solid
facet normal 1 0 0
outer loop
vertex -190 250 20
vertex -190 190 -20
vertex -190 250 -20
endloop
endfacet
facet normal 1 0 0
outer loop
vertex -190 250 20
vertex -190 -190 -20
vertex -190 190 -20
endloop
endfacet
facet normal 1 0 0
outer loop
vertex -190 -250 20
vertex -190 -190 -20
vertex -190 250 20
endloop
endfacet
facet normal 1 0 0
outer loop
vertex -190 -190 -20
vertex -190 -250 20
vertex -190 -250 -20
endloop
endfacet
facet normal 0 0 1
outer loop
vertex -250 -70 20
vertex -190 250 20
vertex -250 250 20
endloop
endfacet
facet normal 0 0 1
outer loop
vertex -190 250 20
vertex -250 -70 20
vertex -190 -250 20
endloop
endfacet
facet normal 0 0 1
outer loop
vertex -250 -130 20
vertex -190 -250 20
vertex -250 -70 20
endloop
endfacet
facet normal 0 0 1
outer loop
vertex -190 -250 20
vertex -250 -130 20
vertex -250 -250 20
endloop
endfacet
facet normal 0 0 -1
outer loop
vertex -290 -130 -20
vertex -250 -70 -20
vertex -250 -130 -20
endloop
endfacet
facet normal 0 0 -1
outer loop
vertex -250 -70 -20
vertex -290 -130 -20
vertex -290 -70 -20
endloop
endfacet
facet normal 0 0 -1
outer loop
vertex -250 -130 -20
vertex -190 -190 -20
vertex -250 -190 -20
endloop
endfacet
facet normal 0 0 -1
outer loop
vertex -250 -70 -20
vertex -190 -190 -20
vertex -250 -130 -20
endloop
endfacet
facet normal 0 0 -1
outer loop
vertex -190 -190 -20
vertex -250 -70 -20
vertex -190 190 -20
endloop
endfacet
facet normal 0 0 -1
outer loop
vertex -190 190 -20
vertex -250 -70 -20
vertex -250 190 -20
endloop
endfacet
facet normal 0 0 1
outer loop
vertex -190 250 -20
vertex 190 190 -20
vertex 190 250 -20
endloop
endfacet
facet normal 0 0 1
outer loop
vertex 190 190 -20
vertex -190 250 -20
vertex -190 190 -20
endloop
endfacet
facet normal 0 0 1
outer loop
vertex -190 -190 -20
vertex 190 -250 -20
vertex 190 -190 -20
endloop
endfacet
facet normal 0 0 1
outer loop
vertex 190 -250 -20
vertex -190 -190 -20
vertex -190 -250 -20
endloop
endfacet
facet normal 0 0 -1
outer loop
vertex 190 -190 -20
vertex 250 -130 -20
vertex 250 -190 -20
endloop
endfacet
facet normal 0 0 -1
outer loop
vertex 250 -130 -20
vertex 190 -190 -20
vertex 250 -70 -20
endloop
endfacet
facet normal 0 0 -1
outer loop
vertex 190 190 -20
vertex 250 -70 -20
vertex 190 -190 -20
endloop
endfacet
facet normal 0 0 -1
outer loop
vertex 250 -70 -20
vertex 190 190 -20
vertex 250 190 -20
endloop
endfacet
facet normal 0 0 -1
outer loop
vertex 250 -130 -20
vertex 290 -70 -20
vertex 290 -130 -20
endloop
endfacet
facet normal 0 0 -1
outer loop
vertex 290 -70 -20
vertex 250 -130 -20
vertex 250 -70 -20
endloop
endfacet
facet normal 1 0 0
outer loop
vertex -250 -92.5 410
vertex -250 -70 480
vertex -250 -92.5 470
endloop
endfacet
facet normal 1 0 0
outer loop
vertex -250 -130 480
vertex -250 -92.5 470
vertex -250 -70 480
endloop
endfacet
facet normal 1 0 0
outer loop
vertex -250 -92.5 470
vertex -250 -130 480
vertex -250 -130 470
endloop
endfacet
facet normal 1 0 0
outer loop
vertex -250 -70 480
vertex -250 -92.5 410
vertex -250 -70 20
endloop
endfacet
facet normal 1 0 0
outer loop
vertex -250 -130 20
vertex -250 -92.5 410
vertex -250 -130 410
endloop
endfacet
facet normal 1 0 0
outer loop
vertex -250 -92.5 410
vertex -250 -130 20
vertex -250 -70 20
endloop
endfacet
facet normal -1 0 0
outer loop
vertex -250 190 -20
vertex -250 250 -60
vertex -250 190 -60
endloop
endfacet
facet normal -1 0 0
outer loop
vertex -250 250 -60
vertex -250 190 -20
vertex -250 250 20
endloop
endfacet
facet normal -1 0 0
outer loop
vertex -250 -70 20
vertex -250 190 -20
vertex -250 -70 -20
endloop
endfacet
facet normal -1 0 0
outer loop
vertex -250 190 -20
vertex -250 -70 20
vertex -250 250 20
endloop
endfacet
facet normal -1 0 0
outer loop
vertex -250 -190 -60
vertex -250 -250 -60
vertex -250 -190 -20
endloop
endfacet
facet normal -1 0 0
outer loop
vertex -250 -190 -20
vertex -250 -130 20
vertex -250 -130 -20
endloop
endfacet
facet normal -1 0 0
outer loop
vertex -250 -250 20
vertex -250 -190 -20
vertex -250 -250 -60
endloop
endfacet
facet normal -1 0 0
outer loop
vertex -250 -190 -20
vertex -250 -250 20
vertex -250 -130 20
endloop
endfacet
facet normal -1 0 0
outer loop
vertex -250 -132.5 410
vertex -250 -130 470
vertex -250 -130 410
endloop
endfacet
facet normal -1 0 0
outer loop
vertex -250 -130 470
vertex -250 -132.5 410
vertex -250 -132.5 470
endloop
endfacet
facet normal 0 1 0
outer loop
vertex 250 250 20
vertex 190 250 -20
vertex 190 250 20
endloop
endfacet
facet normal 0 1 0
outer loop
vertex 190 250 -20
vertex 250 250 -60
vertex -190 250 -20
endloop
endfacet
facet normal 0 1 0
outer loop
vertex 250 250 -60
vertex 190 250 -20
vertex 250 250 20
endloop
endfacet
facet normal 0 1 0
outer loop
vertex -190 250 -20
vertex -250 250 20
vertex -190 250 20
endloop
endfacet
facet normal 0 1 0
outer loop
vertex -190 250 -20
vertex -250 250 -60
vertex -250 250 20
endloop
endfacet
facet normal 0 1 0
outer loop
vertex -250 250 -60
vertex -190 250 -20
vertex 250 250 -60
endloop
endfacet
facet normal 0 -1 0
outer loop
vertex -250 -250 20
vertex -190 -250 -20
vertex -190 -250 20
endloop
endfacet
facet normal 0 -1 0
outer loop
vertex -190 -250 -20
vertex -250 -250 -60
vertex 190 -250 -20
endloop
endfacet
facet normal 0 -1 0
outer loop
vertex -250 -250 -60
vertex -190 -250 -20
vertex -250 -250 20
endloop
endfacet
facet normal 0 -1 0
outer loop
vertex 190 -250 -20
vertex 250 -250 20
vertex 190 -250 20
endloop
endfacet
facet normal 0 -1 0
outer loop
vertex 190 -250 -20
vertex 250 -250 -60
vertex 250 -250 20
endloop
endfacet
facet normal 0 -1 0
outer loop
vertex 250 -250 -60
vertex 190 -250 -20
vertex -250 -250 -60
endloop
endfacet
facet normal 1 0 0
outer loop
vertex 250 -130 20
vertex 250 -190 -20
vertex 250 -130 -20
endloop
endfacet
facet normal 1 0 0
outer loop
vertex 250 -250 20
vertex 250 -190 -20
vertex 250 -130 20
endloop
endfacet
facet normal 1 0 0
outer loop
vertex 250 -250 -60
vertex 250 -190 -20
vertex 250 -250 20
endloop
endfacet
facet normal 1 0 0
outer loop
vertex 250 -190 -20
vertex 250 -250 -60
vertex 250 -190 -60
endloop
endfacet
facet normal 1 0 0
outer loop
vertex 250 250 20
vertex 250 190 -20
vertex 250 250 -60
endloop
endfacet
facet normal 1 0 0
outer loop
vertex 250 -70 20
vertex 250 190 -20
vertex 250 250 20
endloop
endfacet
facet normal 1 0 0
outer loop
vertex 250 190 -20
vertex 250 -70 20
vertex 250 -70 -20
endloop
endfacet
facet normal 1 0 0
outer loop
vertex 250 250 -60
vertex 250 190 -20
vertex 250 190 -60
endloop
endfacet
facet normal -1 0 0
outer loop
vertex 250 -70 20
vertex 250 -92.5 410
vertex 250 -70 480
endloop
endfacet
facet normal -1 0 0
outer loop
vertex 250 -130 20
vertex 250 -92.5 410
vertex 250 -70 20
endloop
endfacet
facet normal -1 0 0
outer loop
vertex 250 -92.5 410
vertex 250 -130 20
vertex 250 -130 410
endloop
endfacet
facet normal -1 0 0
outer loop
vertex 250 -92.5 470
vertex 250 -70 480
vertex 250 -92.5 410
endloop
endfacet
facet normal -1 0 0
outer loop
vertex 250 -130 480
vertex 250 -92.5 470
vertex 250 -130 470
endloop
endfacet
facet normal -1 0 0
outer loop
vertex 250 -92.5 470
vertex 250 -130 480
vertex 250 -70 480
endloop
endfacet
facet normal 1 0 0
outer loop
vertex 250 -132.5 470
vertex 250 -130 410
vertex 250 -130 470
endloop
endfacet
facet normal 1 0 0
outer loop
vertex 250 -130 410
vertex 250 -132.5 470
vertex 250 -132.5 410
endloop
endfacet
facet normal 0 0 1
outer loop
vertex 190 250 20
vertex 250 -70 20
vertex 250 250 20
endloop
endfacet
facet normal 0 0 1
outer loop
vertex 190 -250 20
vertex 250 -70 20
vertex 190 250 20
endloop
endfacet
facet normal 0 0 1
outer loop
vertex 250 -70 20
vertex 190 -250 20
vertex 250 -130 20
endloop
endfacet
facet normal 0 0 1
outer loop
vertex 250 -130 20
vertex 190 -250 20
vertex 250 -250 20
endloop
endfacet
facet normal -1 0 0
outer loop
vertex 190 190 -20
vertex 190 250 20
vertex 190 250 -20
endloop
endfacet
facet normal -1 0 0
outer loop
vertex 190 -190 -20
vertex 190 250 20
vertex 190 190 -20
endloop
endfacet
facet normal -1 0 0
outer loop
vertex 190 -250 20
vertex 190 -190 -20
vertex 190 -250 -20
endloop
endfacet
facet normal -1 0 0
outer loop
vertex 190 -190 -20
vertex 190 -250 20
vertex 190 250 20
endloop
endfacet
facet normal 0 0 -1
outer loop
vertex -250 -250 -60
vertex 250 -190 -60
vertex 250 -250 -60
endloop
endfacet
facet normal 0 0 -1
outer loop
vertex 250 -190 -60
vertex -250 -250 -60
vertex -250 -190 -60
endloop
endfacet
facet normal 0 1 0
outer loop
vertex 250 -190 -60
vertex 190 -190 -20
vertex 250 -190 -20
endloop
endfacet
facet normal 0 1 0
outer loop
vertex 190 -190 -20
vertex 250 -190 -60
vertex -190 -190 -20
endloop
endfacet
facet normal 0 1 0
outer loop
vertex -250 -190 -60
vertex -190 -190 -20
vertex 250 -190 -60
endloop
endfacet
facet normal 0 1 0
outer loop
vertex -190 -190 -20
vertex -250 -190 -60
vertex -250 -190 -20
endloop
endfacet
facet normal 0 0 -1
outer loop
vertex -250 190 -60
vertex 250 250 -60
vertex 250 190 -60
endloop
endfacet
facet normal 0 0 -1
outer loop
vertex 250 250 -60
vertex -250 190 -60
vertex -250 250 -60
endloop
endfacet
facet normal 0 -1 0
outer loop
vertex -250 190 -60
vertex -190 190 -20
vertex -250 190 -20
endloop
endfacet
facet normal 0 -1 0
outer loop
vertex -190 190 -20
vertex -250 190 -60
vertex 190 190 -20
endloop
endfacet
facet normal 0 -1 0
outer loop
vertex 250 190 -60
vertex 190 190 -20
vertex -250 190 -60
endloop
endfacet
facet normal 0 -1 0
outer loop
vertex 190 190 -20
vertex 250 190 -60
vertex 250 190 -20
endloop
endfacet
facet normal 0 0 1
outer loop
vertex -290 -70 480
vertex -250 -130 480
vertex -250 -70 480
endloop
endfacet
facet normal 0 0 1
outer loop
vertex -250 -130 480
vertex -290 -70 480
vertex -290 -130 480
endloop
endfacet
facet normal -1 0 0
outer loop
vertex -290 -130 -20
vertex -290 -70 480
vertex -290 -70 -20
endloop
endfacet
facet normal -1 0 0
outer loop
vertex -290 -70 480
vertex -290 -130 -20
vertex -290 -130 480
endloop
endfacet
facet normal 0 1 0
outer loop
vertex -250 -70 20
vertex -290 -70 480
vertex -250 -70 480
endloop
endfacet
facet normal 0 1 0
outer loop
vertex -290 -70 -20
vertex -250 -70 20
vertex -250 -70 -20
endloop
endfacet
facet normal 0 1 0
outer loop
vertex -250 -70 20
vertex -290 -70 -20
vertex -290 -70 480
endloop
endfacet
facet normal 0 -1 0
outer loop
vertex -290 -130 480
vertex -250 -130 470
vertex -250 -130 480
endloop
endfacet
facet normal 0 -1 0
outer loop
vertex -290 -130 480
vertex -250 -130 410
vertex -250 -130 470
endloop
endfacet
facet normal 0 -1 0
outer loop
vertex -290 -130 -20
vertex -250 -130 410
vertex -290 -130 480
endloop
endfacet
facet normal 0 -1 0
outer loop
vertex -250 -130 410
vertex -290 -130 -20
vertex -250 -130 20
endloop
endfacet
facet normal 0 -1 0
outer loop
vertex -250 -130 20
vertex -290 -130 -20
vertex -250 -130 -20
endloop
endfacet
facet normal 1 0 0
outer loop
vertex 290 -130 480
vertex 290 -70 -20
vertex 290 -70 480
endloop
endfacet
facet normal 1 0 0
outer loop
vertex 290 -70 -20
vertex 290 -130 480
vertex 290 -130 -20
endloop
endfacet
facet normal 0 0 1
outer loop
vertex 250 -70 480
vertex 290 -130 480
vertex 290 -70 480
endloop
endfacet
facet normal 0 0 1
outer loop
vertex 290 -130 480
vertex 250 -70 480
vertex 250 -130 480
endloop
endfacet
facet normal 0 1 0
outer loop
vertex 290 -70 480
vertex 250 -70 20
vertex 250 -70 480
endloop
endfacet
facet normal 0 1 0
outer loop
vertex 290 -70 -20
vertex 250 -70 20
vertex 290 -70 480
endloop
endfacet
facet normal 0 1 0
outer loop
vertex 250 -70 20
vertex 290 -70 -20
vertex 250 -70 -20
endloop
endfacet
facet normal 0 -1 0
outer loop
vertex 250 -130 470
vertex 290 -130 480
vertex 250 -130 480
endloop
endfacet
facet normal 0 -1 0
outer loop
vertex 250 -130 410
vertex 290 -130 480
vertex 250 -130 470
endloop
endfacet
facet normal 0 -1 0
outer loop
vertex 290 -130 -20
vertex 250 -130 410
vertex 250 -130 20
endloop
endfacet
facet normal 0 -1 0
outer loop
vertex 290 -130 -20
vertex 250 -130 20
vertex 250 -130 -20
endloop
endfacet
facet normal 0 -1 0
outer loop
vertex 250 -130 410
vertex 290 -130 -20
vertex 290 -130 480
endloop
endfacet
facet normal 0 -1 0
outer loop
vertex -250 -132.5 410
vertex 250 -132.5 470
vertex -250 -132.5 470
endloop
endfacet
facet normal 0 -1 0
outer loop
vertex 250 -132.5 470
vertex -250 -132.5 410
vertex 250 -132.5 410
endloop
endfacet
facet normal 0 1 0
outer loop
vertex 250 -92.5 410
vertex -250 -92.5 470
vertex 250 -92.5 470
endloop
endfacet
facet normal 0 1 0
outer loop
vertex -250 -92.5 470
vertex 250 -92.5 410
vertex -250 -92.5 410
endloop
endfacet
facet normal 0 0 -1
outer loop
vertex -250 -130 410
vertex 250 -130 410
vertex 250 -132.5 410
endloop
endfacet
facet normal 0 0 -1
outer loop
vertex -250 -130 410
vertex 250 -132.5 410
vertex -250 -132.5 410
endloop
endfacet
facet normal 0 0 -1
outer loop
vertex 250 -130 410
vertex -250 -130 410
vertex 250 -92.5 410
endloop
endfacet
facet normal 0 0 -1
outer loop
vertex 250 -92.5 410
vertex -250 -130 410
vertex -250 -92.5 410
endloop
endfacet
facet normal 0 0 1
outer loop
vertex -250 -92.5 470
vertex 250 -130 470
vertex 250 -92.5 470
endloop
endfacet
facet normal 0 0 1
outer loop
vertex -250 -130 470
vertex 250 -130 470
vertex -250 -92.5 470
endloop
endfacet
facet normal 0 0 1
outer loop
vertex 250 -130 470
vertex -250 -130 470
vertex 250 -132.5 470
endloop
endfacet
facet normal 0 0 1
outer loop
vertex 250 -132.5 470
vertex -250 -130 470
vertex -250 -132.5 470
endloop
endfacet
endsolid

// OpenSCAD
profil_H = 40;
profil_W = 60;

profilX_LEN = 500;
profilY_LEN = 500;
profilZ_LEN = 500;
profilX_OFFSET = 250;
profilY_OFFSET = 250;
profilZ_OFFSET = -100;

module profilY() {
    color("gray") cube([profil_W, profilY_LEN, profil_H], center = true);
}

module profilX() {
    color("gray") cube([profilX_LEN, profil_W, profil_H], center = true);
}

module profilZ() {
    color("gray") cube([profil_H, profil_W, profilX_LEN], center = true);
}

# translate([-profilX_OFFSET + profil_W/2, 0, 0]) profilY();
# translate([ profilX_OFFSET - profil_W/2, 0, 0]) profilY();


# translate([0, -profilY_OFFSET + profil_W/2,  -profil_H]) profilX();
# translate([0,  profilY_OFFSET - profil_W/2, -profil_H]) profilX();


// SLUPKI:
# translate([-profilX_OFFSET - profil_H/2, profilZ_OFFSET, profilZ_LEN/2 - profil_H/2 ]) profilZ();

# translate([ profilX_OFFSET + profil_H/2, profilZ_OFFSET, profilZ_LEN/2 - profil_H/2 ]) profilZ();

// RAMA GORNA
translate([0, profilZ_OFFSET-((profil_H+profil_W)/2)/4, profilZ_LEN-profil_H-profil_H/2]) rotate([90, 0, 0]) profilX();
